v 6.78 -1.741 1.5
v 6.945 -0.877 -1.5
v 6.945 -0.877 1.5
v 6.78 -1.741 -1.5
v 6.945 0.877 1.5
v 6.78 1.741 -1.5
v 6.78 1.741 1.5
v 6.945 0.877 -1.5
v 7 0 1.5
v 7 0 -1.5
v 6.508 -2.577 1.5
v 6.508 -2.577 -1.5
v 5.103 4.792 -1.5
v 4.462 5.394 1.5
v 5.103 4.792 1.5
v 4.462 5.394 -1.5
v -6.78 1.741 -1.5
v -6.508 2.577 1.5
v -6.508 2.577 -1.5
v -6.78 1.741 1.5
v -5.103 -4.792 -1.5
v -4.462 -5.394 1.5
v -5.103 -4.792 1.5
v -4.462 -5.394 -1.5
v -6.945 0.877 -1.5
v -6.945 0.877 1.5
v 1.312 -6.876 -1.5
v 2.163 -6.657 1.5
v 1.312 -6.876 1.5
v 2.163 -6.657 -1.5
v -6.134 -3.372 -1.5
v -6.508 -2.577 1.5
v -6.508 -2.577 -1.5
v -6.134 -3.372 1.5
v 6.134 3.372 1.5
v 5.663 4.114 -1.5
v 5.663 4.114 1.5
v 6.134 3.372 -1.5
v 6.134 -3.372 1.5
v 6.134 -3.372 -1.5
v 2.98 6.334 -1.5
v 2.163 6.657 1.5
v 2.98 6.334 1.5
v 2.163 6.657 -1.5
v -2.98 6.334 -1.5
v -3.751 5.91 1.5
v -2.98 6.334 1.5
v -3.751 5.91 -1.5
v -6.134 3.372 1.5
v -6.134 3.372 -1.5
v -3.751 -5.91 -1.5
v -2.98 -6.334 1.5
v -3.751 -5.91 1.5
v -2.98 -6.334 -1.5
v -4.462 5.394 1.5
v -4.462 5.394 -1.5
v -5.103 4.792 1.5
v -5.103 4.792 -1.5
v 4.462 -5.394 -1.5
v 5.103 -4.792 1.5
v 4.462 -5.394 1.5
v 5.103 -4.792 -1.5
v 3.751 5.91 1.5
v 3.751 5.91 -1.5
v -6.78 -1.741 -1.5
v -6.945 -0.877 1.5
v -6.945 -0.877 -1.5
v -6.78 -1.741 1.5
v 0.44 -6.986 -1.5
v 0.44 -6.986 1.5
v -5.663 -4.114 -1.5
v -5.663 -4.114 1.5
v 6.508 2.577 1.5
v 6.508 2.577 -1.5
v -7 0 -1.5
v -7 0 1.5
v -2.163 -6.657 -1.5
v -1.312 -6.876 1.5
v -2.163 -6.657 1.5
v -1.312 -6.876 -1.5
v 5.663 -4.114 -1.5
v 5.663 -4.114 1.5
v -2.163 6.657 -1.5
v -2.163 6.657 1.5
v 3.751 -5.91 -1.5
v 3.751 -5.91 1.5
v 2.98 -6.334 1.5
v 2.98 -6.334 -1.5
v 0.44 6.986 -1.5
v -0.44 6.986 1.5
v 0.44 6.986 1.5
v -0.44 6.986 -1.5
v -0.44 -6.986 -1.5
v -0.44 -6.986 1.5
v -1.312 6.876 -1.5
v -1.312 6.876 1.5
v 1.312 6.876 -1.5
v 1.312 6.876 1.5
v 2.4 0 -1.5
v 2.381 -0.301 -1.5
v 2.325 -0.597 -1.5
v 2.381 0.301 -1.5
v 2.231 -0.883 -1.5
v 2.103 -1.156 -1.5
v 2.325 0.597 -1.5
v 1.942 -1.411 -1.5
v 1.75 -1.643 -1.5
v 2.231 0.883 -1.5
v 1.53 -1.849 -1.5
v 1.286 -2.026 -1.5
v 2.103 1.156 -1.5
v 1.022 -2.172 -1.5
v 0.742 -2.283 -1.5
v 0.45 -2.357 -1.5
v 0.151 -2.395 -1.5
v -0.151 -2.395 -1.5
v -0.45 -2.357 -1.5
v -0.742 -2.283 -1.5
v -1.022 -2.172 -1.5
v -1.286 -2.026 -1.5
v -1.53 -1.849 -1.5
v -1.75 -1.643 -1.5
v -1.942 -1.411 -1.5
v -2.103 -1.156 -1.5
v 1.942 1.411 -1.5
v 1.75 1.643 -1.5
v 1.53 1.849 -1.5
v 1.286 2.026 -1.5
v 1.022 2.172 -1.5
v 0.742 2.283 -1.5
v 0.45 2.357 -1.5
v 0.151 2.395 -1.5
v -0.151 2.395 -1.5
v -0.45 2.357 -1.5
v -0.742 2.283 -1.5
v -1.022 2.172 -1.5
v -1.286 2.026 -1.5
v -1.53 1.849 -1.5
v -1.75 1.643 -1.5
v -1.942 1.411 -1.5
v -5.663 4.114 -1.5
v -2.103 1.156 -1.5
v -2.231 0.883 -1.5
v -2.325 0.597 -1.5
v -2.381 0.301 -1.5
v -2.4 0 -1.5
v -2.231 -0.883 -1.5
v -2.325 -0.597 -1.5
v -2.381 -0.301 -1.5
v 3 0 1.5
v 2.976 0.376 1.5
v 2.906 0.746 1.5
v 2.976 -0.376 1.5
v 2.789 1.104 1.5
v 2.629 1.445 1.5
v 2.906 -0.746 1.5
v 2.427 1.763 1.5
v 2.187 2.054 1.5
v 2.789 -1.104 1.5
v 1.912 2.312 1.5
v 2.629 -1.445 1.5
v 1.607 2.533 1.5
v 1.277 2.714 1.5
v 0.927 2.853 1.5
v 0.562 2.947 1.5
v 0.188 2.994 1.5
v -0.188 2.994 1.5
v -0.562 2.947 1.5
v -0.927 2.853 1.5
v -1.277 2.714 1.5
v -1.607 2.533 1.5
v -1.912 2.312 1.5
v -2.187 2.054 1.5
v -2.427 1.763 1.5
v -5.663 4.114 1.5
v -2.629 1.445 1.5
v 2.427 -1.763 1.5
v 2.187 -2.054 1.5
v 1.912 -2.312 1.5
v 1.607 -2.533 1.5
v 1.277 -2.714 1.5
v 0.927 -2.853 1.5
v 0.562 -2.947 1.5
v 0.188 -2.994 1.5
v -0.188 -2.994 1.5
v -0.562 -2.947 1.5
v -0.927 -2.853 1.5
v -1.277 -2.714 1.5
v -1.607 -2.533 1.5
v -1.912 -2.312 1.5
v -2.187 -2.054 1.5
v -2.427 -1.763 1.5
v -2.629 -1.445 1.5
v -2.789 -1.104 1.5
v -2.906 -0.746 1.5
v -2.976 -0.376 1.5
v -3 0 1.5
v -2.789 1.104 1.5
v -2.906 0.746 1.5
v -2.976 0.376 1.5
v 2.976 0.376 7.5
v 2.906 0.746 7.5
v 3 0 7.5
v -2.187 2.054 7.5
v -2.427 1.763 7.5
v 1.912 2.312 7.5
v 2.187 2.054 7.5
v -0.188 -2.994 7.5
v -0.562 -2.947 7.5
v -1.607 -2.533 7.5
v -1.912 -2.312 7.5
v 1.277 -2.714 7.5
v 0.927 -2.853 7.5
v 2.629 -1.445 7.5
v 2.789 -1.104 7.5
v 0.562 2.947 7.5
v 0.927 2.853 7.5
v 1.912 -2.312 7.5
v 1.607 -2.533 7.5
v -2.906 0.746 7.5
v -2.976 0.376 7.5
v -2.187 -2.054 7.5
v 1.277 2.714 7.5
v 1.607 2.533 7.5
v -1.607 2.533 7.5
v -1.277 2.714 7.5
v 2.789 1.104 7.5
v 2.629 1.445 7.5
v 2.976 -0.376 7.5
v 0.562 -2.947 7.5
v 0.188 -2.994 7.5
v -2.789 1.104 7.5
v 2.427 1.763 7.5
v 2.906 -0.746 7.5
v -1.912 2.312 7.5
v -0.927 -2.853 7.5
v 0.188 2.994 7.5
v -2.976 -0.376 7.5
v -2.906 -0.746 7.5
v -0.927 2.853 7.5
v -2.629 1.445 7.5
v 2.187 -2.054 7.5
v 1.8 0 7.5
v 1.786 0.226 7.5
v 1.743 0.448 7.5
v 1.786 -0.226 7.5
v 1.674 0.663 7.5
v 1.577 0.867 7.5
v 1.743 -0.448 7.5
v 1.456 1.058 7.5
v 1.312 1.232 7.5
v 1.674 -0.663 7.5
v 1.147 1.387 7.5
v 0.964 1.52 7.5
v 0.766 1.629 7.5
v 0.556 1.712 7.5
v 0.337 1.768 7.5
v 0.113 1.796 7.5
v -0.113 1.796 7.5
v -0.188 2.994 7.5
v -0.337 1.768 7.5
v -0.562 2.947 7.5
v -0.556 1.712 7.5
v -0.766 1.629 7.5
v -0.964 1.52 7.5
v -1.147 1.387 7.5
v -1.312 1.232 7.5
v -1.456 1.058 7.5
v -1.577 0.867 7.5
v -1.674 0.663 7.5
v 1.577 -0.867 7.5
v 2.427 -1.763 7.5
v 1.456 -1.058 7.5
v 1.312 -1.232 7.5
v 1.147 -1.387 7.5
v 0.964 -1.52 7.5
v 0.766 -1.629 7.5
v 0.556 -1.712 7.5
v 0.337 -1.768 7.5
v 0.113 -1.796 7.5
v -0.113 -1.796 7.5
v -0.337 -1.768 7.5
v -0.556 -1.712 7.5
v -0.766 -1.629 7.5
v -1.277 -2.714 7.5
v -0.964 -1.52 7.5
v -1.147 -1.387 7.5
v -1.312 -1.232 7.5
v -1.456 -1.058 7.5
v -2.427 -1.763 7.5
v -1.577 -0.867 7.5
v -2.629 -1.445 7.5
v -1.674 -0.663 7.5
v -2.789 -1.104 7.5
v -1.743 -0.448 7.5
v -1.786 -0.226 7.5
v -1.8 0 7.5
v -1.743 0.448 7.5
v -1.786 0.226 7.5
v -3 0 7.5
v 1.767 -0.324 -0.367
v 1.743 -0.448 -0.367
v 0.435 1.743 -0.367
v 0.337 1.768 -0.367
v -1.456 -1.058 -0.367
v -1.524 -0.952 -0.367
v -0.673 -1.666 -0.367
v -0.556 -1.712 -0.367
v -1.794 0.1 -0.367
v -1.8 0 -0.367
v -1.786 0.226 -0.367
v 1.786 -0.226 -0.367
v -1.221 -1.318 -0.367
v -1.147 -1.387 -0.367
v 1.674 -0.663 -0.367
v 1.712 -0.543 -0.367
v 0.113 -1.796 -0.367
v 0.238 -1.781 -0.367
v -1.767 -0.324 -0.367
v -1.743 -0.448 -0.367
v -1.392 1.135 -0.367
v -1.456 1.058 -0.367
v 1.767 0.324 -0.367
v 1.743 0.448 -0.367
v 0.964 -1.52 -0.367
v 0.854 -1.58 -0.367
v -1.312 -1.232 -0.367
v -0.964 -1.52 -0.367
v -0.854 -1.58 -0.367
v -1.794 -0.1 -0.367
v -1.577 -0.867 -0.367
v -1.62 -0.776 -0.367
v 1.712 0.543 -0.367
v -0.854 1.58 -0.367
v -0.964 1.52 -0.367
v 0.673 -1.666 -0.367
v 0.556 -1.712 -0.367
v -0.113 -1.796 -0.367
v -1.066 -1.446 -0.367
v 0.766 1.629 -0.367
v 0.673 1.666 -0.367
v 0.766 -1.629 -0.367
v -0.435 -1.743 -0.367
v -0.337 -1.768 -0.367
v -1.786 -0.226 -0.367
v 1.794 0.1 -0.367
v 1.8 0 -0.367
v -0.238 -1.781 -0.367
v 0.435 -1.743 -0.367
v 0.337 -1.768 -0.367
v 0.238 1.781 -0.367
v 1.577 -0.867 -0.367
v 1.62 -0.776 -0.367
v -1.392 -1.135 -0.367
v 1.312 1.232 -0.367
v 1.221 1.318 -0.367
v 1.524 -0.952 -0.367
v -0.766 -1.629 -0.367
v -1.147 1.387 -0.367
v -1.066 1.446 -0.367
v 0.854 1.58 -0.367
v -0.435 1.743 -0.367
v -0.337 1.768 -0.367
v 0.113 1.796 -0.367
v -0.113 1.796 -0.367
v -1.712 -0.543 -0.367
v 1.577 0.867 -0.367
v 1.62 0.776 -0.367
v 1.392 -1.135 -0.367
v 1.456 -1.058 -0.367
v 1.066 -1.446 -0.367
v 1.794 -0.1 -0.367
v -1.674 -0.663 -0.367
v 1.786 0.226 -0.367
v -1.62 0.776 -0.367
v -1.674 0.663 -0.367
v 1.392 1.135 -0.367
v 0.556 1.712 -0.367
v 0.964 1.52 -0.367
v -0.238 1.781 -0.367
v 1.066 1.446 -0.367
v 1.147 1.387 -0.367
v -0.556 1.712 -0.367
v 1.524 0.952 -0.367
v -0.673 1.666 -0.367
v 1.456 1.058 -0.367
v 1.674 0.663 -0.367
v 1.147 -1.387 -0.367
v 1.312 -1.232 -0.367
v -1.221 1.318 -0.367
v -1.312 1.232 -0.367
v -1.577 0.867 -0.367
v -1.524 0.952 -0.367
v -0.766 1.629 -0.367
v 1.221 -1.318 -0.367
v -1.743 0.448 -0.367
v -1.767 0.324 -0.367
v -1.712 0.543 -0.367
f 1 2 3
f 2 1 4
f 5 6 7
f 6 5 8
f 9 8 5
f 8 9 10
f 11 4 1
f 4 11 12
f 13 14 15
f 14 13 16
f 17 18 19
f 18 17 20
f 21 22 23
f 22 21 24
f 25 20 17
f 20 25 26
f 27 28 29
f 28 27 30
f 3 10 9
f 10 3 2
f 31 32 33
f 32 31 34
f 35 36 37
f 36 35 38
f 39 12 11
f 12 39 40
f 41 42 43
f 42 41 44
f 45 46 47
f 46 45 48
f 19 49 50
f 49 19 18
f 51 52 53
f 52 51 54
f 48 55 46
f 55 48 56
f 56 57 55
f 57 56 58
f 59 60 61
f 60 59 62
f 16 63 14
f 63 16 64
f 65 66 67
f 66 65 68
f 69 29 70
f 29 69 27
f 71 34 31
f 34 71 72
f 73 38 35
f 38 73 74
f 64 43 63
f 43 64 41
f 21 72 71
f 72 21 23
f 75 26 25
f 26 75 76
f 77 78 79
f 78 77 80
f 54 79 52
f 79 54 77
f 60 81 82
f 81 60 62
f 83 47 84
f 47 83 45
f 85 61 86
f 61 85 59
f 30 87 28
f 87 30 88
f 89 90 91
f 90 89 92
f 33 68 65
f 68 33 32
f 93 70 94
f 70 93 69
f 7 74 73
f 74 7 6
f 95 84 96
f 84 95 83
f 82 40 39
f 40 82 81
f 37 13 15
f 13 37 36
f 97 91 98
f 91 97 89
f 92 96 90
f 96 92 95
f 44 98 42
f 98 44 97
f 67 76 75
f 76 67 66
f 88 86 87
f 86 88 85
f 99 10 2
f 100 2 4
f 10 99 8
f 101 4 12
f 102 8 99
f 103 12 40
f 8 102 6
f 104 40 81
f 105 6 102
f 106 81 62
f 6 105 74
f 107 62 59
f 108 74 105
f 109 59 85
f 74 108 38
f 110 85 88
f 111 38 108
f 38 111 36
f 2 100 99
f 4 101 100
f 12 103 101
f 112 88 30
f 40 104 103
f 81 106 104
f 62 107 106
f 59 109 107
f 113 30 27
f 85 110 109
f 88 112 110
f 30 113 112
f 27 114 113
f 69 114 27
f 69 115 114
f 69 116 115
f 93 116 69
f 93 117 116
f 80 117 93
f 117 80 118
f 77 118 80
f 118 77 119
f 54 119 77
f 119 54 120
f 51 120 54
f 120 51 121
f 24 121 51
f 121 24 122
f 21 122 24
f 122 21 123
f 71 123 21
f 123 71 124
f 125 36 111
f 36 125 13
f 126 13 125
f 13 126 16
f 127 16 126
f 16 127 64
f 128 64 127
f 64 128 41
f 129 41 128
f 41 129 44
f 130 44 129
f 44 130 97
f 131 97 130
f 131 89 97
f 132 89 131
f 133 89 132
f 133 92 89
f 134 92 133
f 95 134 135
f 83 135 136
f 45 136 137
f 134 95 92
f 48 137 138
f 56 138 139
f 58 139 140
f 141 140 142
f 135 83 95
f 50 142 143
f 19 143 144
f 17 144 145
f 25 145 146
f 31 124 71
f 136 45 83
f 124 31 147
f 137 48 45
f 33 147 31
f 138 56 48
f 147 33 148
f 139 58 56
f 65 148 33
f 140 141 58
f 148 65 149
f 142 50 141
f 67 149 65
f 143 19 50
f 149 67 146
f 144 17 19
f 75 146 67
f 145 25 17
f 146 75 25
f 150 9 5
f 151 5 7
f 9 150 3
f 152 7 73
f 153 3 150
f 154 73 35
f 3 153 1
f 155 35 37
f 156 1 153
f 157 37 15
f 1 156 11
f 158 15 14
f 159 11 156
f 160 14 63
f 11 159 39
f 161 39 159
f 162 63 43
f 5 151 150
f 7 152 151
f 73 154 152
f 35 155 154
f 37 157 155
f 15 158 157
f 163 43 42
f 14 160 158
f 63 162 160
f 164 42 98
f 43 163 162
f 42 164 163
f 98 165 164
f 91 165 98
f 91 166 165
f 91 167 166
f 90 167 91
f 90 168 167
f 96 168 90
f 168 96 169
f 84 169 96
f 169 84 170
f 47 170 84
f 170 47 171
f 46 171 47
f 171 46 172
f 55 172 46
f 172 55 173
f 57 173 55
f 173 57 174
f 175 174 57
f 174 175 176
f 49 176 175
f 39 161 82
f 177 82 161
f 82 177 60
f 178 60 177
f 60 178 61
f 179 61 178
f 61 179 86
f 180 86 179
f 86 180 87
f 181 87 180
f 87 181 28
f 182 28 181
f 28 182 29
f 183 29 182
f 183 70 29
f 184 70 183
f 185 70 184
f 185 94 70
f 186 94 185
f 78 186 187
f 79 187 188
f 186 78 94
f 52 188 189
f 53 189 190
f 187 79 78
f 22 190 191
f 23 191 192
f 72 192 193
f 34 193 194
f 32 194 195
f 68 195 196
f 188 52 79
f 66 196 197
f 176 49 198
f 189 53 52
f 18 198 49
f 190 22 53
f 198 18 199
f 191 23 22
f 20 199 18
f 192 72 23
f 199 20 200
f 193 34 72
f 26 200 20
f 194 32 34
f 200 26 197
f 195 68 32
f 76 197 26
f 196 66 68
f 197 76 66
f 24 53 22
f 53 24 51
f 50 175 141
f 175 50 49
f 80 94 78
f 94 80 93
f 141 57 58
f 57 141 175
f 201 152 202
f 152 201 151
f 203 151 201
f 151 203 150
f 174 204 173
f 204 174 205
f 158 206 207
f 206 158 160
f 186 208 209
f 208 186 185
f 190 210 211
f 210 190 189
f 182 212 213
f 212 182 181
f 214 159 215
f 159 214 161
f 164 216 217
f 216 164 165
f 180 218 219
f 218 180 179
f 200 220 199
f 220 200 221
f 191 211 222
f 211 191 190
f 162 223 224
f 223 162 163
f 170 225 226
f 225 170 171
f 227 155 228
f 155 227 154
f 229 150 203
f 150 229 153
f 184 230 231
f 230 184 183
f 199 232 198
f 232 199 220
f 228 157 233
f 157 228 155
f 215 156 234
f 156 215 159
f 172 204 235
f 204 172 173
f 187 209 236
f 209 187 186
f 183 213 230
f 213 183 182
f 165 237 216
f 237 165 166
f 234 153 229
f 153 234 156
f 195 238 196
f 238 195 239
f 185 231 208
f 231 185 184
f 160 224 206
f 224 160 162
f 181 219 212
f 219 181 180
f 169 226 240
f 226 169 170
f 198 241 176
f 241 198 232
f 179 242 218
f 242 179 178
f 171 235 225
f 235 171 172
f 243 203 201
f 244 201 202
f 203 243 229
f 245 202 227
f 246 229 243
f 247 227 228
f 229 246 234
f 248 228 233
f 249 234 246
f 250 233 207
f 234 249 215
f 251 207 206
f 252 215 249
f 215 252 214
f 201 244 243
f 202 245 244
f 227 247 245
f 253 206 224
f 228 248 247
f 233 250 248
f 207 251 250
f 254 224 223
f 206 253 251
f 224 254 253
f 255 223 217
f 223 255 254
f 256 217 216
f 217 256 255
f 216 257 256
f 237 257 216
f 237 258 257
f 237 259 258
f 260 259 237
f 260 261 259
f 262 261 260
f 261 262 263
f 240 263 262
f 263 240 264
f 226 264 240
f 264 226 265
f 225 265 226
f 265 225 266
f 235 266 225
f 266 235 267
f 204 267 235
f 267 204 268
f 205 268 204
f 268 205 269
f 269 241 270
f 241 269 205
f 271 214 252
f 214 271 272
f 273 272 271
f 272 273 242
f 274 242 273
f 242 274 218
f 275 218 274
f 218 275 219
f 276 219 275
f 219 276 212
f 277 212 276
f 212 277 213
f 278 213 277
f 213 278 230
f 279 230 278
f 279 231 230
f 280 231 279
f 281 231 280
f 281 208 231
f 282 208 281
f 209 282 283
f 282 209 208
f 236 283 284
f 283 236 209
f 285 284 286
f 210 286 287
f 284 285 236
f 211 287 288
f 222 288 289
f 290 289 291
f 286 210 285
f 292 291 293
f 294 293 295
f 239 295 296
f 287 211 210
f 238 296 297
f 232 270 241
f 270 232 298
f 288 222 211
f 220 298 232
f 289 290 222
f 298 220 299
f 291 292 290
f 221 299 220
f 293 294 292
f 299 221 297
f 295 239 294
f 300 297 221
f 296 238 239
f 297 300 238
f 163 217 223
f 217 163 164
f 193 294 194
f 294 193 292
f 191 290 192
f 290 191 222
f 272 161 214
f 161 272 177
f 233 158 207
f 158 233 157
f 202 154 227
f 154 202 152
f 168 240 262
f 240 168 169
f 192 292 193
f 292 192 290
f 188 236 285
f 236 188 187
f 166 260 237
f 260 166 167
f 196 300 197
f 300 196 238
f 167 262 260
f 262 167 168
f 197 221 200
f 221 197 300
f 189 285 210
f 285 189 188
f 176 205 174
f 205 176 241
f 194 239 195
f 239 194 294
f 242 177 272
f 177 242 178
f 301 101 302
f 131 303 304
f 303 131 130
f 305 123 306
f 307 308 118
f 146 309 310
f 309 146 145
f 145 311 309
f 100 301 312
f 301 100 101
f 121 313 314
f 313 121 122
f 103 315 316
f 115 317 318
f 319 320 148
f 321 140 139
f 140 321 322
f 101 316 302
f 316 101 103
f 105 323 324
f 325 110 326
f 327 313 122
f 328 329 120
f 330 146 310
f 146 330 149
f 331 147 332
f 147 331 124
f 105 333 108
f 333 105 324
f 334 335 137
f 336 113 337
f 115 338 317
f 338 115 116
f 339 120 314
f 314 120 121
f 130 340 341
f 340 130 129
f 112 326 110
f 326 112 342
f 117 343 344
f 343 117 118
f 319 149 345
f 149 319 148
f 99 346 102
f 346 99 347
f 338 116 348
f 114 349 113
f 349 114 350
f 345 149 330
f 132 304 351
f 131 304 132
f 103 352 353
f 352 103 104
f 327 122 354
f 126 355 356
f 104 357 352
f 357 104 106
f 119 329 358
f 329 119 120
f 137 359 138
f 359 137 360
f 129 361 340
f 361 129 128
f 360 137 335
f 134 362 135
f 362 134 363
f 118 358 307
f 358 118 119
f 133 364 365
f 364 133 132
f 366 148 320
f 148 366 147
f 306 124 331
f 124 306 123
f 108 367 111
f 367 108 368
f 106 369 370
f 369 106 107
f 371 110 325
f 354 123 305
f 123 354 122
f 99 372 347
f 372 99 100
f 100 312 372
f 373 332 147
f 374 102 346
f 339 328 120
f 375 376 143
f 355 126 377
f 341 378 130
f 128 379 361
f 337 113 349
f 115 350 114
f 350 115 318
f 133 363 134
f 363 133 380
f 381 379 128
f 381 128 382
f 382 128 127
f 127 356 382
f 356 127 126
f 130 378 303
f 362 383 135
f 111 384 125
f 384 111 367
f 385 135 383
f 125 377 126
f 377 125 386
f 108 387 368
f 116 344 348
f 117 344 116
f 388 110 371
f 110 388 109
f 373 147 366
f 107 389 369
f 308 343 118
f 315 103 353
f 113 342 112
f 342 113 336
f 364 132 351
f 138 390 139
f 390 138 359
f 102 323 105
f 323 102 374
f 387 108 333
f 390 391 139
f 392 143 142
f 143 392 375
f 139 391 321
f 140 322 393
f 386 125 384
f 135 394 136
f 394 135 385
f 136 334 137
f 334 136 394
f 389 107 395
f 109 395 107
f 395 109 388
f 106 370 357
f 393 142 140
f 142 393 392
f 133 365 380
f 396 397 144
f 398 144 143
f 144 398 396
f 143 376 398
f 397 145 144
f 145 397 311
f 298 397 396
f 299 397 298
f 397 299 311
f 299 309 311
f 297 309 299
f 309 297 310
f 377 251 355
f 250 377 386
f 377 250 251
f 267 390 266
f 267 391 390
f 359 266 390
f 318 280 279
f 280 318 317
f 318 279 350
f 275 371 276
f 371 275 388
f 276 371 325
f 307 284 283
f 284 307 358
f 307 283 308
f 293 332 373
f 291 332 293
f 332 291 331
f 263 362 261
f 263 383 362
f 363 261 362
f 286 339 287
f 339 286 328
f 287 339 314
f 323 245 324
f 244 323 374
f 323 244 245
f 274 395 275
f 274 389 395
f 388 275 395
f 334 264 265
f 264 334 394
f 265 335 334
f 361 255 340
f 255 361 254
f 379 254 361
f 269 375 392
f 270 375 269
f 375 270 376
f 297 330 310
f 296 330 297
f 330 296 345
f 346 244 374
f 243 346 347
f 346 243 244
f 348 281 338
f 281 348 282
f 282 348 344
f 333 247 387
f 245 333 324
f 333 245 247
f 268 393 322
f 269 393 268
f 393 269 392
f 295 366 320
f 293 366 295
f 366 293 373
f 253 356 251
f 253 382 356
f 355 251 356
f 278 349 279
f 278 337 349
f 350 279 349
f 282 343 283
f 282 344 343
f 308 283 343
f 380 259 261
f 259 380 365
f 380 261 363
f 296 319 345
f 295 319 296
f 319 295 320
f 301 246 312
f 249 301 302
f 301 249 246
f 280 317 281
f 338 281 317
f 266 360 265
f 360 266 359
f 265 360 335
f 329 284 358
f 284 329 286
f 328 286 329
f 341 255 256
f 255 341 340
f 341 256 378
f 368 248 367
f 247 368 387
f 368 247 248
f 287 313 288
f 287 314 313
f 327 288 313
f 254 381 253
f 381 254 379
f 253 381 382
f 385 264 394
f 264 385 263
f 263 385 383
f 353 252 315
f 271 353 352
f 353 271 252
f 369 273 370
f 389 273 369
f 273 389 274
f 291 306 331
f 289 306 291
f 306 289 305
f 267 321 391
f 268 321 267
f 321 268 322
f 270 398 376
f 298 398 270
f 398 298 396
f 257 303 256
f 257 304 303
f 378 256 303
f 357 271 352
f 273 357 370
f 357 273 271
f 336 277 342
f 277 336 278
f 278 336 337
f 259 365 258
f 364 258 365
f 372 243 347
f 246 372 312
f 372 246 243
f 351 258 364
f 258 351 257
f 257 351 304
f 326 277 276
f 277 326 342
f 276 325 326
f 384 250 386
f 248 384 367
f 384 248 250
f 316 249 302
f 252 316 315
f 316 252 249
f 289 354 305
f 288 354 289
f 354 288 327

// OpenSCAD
$fn = 50;


difference() {
	union() {
		translate(v = [0, 0, -1.5000000000]) {
			cylinder(h = 3, r = 7.0000000000);
		}
		translate(v = [0, 0, -1.5000000000]) {
			cylinder(h = 9, r = 3.0000000000);
		}
	}
	union() {
		translate(v = [0, 0, -1.5000000000]) {
			rotate(a = [0, 180, 0]) {
				difference() {
					union() {
						translate(v = [0, 0, -1.7000000000]) {
							cylinder(h = 1.7000000000, r1 = 1.5000000000, r2 = 2.4000000000);
						}
						translate(v = [0, 0, -9.0000000000]) {
							cylinder(h = 9, r = 1.5000000000);
						}
						translate(v = [0, 0, -9.0000000000]) {
							cylinder(h = 9, r = 1.8000000000);
						}
						translate(v = [0, 0, -9.0000000000]) {
							cylinder(h = 9, r = 1.5000000000);
						}
					}
					union();
				}
			}
		}
		translate(v = [0, 0, -50.0000000000]) {
			cylinder(h = 100, r = 1.5000000000);
		}
	}
}
